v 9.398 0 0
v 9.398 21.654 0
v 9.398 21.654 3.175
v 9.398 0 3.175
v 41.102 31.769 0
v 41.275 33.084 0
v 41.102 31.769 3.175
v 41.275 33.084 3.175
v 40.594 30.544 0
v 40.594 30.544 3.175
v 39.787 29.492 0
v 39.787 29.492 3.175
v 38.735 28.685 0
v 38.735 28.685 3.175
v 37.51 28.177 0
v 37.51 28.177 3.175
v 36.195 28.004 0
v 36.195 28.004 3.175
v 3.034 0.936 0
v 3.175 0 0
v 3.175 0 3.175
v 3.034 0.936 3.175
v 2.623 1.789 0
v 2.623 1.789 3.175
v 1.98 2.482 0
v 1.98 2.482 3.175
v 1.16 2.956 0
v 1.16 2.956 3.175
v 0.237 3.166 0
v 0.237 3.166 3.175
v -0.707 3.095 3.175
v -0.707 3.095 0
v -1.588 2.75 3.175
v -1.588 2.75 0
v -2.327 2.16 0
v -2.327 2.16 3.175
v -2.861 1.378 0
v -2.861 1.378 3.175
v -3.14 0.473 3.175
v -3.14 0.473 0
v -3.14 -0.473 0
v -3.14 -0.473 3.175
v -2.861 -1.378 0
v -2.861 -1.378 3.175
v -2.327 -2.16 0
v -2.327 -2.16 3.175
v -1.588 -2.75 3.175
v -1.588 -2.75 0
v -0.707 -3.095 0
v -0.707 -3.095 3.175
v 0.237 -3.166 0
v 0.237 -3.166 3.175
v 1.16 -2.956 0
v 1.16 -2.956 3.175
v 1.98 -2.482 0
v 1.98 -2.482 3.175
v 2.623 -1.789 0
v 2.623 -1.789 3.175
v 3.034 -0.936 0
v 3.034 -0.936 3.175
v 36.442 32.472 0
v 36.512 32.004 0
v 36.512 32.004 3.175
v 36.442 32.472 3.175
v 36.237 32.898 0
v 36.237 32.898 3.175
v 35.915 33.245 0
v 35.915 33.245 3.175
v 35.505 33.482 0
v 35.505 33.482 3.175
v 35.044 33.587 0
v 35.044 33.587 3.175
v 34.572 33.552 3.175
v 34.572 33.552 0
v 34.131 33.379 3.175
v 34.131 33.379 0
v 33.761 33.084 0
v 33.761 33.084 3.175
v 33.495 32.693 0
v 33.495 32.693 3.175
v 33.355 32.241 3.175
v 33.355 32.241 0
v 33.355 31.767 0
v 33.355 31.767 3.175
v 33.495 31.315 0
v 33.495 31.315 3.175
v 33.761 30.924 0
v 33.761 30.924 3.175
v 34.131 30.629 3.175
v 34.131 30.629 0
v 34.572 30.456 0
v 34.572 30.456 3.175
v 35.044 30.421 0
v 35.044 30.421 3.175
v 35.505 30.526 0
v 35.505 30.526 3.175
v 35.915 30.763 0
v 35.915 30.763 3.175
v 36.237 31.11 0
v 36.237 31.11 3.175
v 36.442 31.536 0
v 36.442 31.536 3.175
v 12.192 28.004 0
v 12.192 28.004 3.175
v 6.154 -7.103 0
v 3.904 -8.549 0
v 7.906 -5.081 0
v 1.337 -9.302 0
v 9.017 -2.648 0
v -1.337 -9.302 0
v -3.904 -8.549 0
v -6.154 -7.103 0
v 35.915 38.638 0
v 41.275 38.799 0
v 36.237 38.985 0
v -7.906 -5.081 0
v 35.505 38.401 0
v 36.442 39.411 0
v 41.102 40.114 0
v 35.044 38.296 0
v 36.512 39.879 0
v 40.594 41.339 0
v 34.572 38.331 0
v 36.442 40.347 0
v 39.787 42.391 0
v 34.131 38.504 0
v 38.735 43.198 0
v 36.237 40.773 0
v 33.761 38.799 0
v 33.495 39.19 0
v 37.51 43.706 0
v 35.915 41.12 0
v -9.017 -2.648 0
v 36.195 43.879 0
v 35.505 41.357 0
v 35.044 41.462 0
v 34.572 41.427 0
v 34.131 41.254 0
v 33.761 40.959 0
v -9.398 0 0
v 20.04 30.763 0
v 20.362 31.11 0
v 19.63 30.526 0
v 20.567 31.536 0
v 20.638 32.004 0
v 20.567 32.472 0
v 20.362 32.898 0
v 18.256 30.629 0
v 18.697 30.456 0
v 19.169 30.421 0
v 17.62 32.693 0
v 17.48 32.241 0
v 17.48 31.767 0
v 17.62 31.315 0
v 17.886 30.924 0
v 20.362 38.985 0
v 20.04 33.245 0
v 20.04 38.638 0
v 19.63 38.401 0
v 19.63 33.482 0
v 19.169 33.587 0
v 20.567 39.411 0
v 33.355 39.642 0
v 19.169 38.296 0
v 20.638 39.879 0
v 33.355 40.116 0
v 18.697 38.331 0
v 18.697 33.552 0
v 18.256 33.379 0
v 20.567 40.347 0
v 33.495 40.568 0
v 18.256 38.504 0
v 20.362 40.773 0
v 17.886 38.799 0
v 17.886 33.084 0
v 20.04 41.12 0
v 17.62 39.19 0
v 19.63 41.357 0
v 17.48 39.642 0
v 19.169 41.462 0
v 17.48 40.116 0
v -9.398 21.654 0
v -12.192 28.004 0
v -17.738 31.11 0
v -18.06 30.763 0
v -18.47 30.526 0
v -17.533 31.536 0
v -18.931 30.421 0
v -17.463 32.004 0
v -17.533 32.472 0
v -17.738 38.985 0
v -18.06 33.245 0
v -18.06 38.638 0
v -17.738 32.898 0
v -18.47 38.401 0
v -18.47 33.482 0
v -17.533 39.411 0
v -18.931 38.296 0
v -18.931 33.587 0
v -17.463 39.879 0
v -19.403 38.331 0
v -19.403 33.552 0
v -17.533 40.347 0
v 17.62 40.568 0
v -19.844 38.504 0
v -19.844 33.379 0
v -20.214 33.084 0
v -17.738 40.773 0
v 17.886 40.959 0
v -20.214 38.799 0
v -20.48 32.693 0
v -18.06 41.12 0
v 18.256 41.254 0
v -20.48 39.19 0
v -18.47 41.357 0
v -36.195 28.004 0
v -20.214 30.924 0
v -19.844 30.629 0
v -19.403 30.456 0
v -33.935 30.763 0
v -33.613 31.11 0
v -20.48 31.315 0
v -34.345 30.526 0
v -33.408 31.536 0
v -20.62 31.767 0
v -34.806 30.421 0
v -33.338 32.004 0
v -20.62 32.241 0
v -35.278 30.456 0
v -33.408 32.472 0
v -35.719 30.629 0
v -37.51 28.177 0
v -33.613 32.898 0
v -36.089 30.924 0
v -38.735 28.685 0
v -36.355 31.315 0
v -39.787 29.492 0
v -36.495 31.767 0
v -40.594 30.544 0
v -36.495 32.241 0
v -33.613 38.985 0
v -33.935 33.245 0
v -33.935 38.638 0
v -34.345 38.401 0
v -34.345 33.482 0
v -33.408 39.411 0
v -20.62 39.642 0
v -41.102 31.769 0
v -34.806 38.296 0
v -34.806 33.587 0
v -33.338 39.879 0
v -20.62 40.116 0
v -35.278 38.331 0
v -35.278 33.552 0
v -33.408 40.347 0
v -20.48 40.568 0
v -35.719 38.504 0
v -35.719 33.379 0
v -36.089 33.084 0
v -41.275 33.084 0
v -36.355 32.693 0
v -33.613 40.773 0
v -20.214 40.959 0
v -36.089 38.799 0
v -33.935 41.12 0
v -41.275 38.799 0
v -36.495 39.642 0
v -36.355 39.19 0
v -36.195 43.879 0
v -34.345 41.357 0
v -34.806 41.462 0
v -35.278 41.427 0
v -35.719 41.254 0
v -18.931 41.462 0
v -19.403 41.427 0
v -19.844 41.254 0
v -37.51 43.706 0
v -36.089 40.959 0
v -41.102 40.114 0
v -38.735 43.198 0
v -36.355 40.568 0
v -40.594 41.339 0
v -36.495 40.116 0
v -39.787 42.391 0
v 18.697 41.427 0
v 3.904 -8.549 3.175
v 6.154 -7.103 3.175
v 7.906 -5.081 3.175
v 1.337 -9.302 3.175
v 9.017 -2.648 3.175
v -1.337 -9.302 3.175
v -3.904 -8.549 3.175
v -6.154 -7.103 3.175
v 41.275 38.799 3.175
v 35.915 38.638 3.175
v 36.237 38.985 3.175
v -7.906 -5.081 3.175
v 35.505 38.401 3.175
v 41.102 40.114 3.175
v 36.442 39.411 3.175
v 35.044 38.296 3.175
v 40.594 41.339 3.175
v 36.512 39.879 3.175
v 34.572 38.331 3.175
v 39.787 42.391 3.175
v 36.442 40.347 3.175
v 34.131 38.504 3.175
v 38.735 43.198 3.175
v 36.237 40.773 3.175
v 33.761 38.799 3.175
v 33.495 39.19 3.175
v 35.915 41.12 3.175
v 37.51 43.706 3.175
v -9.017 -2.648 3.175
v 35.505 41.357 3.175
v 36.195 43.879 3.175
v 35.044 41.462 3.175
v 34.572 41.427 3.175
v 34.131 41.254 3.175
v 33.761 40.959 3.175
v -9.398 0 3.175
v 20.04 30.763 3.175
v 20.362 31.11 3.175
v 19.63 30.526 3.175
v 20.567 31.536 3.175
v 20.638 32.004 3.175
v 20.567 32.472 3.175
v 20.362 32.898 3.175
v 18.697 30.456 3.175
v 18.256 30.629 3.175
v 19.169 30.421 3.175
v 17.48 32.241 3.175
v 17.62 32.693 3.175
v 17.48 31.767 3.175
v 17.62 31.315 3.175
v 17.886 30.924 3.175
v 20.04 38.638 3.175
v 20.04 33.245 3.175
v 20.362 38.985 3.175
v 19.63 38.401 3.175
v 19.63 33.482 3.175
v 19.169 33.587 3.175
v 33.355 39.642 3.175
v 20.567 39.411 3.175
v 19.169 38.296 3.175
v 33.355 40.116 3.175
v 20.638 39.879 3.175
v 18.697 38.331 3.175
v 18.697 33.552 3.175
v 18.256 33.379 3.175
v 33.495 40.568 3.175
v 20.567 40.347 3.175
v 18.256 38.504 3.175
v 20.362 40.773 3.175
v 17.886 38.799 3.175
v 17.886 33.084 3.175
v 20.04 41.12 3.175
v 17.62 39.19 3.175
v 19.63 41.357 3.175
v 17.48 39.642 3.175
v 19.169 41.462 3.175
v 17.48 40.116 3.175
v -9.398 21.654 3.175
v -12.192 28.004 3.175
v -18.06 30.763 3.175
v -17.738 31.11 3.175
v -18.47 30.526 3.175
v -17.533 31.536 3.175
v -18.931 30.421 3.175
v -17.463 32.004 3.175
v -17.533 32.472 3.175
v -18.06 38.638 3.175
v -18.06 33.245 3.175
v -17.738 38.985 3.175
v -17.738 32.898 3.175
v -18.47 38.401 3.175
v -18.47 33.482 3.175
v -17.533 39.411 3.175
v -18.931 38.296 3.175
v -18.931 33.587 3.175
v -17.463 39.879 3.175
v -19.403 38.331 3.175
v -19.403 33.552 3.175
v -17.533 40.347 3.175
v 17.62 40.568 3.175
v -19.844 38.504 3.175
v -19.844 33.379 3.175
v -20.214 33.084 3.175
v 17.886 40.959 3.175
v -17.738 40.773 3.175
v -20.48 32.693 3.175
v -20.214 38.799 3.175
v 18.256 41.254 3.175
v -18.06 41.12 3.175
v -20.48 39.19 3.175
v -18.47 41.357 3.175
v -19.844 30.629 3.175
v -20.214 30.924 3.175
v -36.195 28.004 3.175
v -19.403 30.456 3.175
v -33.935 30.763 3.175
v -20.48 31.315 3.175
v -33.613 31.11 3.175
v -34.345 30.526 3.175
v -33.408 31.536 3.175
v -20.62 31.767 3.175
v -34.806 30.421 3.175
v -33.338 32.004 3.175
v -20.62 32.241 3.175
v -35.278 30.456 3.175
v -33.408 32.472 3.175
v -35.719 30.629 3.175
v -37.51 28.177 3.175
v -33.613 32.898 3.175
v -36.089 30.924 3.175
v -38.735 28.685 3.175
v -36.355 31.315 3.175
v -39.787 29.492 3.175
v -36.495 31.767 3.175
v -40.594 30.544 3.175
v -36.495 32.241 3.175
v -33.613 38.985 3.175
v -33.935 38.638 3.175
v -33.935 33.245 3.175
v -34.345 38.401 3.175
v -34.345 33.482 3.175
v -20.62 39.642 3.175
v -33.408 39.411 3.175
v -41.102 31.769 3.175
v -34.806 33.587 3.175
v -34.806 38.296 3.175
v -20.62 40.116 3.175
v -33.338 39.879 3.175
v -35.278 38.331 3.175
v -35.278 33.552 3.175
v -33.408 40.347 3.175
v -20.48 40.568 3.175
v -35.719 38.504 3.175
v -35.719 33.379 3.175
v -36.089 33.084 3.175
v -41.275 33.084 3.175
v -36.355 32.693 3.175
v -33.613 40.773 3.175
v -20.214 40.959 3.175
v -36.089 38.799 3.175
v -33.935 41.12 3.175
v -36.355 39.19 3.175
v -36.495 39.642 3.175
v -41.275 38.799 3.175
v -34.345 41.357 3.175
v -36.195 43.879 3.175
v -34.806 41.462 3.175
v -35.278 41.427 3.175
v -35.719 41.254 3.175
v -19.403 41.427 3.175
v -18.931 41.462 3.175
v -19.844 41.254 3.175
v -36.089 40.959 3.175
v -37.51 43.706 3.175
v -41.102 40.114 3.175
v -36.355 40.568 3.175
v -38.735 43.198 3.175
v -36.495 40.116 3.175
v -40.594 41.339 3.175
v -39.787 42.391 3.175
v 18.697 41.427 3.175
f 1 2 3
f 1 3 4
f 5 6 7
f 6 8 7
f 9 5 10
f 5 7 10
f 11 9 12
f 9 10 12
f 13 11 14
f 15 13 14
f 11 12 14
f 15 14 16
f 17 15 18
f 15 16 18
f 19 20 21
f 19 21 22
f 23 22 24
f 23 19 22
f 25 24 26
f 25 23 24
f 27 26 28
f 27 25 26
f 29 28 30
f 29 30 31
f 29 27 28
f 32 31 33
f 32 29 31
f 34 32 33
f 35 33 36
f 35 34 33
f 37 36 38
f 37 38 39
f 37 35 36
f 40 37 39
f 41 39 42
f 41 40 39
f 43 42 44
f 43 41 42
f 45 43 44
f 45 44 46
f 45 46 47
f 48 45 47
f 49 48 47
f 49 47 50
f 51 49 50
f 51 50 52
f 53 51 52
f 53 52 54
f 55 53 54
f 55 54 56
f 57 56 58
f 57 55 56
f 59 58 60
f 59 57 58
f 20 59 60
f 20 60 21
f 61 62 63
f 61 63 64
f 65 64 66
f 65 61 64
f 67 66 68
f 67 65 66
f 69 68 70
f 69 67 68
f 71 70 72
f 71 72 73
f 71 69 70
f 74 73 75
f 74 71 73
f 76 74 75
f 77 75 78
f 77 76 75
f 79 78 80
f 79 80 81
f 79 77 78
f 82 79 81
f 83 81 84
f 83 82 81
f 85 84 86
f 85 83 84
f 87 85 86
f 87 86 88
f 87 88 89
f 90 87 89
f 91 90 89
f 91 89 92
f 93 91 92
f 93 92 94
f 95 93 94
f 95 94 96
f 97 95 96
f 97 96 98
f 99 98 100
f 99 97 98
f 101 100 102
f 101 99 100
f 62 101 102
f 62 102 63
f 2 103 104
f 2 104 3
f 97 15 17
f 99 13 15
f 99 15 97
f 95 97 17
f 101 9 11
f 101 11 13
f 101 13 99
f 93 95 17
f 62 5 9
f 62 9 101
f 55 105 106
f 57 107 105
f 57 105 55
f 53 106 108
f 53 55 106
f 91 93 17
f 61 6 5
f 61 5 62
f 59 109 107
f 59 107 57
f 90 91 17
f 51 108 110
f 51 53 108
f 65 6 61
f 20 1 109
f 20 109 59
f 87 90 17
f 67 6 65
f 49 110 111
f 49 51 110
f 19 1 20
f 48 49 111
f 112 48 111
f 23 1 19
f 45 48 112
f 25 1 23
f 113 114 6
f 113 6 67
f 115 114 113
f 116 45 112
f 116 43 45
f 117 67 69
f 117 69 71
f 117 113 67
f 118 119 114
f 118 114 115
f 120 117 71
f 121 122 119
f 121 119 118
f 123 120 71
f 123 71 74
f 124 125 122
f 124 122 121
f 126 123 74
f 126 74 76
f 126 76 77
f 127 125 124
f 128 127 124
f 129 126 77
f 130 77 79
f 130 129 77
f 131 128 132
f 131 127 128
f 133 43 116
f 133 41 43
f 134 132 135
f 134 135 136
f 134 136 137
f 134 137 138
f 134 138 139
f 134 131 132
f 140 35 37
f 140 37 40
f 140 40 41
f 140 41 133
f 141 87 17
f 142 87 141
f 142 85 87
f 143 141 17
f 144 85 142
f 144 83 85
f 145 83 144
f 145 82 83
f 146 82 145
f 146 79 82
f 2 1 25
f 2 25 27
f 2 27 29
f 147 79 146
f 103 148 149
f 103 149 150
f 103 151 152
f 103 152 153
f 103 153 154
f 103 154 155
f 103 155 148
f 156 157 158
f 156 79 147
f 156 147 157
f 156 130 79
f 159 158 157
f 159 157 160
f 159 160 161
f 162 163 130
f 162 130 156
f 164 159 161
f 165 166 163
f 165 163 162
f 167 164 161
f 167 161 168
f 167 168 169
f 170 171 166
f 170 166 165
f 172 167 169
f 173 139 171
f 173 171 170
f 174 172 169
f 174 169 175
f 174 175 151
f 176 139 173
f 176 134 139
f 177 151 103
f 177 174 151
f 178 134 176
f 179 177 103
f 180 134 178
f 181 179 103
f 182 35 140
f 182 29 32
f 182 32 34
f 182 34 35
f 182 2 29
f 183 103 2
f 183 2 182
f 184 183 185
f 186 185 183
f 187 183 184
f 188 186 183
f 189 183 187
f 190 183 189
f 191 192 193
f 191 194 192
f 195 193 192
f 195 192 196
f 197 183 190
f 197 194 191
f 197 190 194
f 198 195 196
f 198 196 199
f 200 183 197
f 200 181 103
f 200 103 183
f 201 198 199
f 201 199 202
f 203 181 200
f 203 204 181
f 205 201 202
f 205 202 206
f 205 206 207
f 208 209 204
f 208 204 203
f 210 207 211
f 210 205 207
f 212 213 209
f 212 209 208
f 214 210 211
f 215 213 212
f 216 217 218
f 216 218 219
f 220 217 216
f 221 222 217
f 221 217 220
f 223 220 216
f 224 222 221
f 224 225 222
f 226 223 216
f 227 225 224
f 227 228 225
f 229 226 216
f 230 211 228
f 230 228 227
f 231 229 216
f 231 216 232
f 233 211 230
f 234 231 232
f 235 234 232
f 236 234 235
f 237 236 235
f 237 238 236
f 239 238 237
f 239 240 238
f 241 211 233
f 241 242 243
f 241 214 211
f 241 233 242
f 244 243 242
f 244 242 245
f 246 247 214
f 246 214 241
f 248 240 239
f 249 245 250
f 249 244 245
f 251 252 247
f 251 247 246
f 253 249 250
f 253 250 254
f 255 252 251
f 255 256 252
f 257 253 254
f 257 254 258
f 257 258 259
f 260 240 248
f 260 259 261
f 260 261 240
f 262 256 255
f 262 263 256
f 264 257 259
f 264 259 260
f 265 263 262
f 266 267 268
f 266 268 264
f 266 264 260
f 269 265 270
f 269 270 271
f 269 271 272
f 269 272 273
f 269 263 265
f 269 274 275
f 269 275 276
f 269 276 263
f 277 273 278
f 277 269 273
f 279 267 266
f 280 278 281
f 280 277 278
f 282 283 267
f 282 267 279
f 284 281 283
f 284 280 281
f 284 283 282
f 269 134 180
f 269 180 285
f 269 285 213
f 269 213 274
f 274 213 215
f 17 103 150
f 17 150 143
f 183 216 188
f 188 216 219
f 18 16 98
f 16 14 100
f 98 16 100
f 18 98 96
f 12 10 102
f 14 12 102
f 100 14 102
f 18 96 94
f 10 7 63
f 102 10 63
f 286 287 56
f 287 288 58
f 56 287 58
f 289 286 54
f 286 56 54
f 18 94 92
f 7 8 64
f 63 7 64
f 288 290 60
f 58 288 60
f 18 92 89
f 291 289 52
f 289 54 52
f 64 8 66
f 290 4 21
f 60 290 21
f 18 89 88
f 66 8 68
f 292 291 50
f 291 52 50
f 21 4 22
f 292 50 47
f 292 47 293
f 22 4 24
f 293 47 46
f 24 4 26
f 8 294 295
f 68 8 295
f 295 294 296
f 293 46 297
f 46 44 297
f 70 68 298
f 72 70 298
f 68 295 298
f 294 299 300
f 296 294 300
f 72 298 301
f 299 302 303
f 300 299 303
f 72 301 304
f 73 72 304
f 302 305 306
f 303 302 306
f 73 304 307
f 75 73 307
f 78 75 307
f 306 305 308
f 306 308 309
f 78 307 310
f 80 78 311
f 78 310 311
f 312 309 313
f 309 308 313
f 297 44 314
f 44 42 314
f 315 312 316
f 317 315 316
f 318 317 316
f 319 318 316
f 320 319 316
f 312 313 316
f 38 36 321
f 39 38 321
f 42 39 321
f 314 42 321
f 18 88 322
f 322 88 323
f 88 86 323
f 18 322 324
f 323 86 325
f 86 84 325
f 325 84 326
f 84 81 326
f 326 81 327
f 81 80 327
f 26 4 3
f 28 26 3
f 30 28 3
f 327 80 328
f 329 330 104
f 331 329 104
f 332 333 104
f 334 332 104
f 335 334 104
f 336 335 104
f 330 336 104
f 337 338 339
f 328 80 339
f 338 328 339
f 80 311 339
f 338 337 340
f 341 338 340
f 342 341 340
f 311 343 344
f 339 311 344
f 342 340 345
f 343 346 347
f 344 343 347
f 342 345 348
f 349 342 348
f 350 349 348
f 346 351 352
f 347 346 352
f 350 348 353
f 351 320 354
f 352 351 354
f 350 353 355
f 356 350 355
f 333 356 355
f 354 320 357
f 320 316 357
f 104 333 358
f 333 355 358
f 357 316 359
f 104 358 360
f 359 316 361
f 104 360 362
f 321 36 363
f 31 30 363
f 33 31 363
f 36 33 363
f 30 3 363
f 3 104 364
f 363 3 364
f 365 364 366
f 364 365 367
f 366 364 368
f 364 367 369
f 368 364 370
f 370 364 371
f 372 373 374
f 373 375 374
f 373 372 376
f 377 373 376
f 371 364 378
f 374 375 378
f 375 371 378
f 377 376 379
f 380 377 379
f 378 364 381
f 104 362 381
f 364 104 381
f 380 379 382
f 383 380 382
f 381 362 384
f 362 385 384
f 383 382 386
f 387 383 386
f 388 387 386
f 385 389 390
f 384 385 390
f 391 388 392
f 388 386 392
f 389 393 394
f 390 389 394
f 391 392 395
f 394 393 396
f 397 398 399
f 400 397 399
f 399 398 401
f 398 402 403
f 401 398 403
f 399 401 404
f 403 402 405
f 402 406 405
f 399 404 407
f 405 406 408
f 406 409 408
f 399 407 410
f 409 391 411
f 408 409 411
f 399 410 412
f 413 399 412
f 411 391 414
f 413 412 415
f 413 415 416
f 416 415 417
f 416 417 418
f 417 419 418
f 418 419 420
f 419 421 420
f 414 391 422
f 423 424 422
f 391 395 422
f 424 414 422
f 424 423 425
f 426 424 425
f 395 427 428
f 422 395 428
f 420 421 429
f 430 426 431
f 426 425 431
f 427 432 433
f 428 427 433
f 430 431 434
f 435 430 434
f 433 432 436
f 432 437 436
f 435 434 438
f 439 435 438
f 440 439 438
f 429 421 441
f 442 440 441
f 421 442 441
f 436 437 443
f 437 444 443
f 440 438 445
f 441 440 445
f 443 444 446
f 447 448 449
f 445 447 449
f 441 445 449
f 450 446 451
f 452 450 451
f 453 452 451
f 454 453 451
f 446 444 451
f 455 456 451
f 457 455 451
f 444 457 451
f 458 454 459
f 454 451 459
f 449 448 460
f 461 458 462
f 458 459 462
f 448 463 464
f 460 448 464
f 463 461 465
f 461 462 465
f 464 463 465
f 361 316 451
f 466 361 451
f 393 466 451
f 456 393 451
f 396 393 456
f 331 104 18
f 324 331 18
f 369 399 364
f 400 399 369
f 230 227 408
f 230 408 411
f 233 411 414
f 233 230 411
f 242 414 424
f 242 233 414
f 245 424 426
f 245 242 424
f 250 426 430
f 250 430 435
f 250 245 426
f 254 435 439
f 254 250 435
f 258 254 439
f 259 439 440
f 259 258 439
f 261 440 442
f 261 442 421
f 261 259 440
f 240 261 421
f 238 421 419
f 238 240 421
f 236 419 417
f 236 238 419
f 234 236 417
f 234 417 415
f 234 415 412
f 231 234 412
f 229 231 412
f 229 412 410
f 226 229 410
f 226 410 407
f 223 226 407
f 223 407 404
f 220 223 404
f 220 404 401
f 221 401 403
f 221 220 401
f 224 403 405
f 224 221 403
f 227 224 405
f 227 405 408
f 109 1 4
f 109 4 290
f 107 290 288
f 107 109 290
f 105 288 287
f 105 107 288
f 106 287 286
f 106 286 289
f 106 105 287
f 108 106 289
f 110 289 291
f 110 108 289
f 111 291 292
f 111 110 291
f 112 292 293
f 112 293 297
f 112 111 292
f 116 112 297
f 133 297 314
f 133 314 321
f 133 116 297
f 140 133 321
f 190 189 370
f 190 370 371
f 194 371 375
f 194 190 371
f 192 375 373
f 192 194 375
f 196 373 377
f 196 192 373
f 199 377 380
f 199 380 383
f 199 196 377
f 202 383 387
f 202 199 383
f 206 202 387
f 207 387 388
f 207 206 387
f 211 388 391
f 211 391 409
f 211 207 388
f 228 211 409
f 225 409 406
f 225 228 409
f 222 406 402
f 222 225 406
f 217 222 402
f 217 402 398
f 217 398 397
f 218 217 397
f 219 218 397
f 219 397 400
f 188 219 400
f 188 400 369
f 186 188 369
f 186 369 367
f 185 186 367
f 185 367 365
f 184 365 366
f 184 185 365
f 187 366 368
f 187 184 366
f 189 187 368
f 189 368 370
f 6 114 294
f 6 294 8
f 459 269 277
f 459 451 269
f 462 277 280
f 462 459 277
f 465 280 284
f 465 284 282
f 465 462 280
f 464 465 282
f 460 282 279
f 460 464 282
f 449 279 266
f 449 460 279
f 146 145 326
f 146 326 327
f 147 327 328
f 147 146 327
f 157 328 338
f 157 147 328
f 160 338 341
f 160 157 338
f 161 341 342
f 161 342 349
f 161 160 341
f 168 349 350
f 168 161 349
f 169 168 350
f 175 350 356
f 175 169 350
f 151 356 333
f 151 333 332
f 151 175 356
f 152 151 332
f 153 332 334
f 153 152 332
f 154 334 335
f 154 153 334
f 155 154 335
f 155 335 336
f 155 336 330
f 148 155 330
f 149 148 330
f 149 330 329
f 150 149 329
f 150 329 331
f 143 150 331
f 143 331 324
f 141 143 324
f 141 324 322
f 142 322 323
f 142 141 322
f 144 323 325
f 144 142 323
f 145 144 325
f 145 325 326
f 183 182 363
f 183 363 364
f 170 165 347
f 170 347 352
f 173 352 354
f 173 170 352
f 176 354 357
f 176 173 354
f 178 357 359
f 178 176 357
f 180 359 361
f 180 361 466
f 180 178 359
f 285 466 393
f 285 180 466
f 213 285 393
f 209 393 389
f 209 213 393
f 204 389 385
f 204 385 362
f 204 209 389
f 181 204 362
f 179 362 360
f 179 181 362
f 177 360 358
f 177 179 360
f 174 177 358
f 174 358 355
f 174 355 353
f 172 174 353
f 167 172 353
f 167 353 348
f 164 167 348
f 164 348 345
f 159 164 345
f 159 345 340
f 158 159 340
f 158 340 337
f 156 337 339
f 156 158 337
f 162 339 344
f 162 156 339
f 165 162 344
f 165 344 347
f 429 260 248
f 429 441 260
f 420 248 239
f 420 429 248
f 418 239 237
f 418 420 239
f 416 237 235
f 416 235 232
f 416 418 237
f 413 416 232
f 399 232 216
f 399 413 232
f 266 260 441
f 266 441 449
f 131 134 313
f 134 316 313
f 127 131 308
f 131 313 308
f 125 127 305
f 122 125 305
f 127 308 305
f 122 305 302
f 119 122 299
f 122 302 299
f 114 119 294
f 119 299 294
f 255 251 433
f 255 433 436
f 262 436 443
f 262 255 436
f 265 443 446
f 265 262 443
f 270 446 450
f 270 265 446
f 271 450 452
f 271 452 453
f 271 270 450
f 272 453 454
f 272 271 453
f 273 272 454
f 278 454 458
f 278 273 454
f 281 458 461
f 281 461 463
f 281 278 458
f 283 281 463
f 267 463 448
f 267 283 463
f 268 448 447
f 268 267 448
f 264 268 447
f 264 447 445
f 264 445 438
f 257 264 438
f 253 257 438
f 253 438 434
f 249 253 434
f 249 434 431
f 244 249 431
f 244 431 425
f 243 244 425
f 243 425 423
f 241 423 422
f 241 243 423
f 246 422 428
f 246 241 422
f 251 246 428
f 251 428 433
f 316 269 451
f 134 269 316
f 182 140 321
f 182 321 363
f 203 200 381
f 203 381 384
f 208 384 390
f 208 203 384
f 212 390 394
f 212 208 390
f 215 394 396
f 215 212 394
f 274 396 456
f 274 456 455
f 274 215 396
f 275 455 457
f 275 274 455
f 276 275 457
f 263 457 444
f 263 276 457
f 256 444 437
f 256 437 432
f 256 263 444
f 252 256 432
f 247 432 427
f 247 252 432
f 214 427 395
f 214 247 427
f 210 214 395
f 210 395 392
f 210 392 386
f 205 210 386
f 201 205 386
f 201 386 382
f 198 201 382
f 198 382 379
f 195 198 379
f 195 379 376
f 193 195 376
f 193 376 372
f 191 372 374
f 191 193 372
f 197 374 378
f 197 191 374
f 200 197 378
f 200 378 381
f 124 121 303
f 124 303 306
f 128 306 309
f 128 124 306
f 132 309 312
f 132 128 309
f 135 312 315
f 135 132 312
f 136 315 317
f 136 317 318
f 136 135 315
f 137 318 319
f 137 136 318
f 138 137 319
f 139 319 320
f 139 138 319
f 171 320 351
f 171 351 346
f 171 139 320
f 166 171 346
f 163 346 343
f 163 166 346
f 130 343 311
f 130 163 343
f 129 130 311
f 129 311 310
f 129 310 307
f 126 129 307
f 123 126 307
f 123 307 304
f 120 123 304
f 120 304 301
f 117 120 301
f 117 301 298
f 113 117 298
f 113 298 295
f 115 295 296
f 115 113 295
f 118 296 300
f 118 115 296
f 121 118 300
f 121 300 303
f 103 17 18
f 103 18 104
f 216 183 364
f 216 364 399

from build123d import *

# Parameters (mm, degrees)
SKETCH1_R           = 3.175
SKETCH1_R_2         = 1.5875
BOSS_EXTRUDE1_DEPTH = 3.175
FILLET1_R           = 5.08


with BuildPart() as part:
    # Sketch1 → Boss-Extrude1 (new body)
    with BuildSketch(Plane.XY):
        with BuildLine():
            Line((-41.275, 43.879), (41.275, 43.879))
            Line((41.275, 43.879), (41.275, 28.004))
            Line((41.275, 28.004), (12.192, 28.004))
            Line((12.192, 28.004), (9.398, 21.654))
            Line((9.398, 21.654), (9.398, 0))
            ThreePointArc((9.398, 0), (0, -9.398), (-9.398, 0))
            Line((-9.398, 0), (-9.398, 21.654))
            Line((-9.398, 21.654), (-12.192, 28.004))
            Line((-12.192, 28.004), (-41.275, 28.004))
            Line((-41.275, 28.004), (-41.275, 43.879))
        make_face()
        Circle(SKETCH1_R, mode=Mode.SUBTRACT)
        with Locations((-19.05, 32.004)):
            Circle(SKETCH1_R_2, mode=Mode.SUBTRACT)
        with Locations((-34.925, 32.004)):
            Circle(SKETCH1_R_2, mode=Mode.SUBTRACT)
        with Locations((34.925, 32.004)):
            Circle(SKETCH1_R_2, mode=Mode.SUBTRACT)
        with Locations((19.05, 32.004)):
            Circle(SKETCH1_R_2, mode=Mode.SUBTRACT)
        with Locations((-19.05, 39.879)):
            Circle(SKETCH1_R_2, mode=Mode.SUBTRACT)
        with Locations((-34.925, 39.879)):
            Circle(SKETCH1_R_2, mode=Mode.SUBTRACT)
        with Locations((34.925, 39.879)):
            Circle(SKETCH1_R_2, mode=Mode.SUBTRACT)
        with Locations((19.05, 39.879)):
            Circle(SKETCH1_R_2, mode=Mode.SUBTRACT)
    extrude(amount=BOSS_EXTRUDE1_DEPTH)

    # Fillet1
    fillet1_edges = [part.edges().sort_by_distance(p)[0] for p in [
        (-41.275, 43.879, 1.5875),
        (41.275, 43.879, 1.5875),
        (41.275, 28.004, 1.5875),
        (-41.275, 28.004, 1.5875),
    ]]
    fillet(fillet1_edges, radius=FILLET1_R)


solid = part.part
